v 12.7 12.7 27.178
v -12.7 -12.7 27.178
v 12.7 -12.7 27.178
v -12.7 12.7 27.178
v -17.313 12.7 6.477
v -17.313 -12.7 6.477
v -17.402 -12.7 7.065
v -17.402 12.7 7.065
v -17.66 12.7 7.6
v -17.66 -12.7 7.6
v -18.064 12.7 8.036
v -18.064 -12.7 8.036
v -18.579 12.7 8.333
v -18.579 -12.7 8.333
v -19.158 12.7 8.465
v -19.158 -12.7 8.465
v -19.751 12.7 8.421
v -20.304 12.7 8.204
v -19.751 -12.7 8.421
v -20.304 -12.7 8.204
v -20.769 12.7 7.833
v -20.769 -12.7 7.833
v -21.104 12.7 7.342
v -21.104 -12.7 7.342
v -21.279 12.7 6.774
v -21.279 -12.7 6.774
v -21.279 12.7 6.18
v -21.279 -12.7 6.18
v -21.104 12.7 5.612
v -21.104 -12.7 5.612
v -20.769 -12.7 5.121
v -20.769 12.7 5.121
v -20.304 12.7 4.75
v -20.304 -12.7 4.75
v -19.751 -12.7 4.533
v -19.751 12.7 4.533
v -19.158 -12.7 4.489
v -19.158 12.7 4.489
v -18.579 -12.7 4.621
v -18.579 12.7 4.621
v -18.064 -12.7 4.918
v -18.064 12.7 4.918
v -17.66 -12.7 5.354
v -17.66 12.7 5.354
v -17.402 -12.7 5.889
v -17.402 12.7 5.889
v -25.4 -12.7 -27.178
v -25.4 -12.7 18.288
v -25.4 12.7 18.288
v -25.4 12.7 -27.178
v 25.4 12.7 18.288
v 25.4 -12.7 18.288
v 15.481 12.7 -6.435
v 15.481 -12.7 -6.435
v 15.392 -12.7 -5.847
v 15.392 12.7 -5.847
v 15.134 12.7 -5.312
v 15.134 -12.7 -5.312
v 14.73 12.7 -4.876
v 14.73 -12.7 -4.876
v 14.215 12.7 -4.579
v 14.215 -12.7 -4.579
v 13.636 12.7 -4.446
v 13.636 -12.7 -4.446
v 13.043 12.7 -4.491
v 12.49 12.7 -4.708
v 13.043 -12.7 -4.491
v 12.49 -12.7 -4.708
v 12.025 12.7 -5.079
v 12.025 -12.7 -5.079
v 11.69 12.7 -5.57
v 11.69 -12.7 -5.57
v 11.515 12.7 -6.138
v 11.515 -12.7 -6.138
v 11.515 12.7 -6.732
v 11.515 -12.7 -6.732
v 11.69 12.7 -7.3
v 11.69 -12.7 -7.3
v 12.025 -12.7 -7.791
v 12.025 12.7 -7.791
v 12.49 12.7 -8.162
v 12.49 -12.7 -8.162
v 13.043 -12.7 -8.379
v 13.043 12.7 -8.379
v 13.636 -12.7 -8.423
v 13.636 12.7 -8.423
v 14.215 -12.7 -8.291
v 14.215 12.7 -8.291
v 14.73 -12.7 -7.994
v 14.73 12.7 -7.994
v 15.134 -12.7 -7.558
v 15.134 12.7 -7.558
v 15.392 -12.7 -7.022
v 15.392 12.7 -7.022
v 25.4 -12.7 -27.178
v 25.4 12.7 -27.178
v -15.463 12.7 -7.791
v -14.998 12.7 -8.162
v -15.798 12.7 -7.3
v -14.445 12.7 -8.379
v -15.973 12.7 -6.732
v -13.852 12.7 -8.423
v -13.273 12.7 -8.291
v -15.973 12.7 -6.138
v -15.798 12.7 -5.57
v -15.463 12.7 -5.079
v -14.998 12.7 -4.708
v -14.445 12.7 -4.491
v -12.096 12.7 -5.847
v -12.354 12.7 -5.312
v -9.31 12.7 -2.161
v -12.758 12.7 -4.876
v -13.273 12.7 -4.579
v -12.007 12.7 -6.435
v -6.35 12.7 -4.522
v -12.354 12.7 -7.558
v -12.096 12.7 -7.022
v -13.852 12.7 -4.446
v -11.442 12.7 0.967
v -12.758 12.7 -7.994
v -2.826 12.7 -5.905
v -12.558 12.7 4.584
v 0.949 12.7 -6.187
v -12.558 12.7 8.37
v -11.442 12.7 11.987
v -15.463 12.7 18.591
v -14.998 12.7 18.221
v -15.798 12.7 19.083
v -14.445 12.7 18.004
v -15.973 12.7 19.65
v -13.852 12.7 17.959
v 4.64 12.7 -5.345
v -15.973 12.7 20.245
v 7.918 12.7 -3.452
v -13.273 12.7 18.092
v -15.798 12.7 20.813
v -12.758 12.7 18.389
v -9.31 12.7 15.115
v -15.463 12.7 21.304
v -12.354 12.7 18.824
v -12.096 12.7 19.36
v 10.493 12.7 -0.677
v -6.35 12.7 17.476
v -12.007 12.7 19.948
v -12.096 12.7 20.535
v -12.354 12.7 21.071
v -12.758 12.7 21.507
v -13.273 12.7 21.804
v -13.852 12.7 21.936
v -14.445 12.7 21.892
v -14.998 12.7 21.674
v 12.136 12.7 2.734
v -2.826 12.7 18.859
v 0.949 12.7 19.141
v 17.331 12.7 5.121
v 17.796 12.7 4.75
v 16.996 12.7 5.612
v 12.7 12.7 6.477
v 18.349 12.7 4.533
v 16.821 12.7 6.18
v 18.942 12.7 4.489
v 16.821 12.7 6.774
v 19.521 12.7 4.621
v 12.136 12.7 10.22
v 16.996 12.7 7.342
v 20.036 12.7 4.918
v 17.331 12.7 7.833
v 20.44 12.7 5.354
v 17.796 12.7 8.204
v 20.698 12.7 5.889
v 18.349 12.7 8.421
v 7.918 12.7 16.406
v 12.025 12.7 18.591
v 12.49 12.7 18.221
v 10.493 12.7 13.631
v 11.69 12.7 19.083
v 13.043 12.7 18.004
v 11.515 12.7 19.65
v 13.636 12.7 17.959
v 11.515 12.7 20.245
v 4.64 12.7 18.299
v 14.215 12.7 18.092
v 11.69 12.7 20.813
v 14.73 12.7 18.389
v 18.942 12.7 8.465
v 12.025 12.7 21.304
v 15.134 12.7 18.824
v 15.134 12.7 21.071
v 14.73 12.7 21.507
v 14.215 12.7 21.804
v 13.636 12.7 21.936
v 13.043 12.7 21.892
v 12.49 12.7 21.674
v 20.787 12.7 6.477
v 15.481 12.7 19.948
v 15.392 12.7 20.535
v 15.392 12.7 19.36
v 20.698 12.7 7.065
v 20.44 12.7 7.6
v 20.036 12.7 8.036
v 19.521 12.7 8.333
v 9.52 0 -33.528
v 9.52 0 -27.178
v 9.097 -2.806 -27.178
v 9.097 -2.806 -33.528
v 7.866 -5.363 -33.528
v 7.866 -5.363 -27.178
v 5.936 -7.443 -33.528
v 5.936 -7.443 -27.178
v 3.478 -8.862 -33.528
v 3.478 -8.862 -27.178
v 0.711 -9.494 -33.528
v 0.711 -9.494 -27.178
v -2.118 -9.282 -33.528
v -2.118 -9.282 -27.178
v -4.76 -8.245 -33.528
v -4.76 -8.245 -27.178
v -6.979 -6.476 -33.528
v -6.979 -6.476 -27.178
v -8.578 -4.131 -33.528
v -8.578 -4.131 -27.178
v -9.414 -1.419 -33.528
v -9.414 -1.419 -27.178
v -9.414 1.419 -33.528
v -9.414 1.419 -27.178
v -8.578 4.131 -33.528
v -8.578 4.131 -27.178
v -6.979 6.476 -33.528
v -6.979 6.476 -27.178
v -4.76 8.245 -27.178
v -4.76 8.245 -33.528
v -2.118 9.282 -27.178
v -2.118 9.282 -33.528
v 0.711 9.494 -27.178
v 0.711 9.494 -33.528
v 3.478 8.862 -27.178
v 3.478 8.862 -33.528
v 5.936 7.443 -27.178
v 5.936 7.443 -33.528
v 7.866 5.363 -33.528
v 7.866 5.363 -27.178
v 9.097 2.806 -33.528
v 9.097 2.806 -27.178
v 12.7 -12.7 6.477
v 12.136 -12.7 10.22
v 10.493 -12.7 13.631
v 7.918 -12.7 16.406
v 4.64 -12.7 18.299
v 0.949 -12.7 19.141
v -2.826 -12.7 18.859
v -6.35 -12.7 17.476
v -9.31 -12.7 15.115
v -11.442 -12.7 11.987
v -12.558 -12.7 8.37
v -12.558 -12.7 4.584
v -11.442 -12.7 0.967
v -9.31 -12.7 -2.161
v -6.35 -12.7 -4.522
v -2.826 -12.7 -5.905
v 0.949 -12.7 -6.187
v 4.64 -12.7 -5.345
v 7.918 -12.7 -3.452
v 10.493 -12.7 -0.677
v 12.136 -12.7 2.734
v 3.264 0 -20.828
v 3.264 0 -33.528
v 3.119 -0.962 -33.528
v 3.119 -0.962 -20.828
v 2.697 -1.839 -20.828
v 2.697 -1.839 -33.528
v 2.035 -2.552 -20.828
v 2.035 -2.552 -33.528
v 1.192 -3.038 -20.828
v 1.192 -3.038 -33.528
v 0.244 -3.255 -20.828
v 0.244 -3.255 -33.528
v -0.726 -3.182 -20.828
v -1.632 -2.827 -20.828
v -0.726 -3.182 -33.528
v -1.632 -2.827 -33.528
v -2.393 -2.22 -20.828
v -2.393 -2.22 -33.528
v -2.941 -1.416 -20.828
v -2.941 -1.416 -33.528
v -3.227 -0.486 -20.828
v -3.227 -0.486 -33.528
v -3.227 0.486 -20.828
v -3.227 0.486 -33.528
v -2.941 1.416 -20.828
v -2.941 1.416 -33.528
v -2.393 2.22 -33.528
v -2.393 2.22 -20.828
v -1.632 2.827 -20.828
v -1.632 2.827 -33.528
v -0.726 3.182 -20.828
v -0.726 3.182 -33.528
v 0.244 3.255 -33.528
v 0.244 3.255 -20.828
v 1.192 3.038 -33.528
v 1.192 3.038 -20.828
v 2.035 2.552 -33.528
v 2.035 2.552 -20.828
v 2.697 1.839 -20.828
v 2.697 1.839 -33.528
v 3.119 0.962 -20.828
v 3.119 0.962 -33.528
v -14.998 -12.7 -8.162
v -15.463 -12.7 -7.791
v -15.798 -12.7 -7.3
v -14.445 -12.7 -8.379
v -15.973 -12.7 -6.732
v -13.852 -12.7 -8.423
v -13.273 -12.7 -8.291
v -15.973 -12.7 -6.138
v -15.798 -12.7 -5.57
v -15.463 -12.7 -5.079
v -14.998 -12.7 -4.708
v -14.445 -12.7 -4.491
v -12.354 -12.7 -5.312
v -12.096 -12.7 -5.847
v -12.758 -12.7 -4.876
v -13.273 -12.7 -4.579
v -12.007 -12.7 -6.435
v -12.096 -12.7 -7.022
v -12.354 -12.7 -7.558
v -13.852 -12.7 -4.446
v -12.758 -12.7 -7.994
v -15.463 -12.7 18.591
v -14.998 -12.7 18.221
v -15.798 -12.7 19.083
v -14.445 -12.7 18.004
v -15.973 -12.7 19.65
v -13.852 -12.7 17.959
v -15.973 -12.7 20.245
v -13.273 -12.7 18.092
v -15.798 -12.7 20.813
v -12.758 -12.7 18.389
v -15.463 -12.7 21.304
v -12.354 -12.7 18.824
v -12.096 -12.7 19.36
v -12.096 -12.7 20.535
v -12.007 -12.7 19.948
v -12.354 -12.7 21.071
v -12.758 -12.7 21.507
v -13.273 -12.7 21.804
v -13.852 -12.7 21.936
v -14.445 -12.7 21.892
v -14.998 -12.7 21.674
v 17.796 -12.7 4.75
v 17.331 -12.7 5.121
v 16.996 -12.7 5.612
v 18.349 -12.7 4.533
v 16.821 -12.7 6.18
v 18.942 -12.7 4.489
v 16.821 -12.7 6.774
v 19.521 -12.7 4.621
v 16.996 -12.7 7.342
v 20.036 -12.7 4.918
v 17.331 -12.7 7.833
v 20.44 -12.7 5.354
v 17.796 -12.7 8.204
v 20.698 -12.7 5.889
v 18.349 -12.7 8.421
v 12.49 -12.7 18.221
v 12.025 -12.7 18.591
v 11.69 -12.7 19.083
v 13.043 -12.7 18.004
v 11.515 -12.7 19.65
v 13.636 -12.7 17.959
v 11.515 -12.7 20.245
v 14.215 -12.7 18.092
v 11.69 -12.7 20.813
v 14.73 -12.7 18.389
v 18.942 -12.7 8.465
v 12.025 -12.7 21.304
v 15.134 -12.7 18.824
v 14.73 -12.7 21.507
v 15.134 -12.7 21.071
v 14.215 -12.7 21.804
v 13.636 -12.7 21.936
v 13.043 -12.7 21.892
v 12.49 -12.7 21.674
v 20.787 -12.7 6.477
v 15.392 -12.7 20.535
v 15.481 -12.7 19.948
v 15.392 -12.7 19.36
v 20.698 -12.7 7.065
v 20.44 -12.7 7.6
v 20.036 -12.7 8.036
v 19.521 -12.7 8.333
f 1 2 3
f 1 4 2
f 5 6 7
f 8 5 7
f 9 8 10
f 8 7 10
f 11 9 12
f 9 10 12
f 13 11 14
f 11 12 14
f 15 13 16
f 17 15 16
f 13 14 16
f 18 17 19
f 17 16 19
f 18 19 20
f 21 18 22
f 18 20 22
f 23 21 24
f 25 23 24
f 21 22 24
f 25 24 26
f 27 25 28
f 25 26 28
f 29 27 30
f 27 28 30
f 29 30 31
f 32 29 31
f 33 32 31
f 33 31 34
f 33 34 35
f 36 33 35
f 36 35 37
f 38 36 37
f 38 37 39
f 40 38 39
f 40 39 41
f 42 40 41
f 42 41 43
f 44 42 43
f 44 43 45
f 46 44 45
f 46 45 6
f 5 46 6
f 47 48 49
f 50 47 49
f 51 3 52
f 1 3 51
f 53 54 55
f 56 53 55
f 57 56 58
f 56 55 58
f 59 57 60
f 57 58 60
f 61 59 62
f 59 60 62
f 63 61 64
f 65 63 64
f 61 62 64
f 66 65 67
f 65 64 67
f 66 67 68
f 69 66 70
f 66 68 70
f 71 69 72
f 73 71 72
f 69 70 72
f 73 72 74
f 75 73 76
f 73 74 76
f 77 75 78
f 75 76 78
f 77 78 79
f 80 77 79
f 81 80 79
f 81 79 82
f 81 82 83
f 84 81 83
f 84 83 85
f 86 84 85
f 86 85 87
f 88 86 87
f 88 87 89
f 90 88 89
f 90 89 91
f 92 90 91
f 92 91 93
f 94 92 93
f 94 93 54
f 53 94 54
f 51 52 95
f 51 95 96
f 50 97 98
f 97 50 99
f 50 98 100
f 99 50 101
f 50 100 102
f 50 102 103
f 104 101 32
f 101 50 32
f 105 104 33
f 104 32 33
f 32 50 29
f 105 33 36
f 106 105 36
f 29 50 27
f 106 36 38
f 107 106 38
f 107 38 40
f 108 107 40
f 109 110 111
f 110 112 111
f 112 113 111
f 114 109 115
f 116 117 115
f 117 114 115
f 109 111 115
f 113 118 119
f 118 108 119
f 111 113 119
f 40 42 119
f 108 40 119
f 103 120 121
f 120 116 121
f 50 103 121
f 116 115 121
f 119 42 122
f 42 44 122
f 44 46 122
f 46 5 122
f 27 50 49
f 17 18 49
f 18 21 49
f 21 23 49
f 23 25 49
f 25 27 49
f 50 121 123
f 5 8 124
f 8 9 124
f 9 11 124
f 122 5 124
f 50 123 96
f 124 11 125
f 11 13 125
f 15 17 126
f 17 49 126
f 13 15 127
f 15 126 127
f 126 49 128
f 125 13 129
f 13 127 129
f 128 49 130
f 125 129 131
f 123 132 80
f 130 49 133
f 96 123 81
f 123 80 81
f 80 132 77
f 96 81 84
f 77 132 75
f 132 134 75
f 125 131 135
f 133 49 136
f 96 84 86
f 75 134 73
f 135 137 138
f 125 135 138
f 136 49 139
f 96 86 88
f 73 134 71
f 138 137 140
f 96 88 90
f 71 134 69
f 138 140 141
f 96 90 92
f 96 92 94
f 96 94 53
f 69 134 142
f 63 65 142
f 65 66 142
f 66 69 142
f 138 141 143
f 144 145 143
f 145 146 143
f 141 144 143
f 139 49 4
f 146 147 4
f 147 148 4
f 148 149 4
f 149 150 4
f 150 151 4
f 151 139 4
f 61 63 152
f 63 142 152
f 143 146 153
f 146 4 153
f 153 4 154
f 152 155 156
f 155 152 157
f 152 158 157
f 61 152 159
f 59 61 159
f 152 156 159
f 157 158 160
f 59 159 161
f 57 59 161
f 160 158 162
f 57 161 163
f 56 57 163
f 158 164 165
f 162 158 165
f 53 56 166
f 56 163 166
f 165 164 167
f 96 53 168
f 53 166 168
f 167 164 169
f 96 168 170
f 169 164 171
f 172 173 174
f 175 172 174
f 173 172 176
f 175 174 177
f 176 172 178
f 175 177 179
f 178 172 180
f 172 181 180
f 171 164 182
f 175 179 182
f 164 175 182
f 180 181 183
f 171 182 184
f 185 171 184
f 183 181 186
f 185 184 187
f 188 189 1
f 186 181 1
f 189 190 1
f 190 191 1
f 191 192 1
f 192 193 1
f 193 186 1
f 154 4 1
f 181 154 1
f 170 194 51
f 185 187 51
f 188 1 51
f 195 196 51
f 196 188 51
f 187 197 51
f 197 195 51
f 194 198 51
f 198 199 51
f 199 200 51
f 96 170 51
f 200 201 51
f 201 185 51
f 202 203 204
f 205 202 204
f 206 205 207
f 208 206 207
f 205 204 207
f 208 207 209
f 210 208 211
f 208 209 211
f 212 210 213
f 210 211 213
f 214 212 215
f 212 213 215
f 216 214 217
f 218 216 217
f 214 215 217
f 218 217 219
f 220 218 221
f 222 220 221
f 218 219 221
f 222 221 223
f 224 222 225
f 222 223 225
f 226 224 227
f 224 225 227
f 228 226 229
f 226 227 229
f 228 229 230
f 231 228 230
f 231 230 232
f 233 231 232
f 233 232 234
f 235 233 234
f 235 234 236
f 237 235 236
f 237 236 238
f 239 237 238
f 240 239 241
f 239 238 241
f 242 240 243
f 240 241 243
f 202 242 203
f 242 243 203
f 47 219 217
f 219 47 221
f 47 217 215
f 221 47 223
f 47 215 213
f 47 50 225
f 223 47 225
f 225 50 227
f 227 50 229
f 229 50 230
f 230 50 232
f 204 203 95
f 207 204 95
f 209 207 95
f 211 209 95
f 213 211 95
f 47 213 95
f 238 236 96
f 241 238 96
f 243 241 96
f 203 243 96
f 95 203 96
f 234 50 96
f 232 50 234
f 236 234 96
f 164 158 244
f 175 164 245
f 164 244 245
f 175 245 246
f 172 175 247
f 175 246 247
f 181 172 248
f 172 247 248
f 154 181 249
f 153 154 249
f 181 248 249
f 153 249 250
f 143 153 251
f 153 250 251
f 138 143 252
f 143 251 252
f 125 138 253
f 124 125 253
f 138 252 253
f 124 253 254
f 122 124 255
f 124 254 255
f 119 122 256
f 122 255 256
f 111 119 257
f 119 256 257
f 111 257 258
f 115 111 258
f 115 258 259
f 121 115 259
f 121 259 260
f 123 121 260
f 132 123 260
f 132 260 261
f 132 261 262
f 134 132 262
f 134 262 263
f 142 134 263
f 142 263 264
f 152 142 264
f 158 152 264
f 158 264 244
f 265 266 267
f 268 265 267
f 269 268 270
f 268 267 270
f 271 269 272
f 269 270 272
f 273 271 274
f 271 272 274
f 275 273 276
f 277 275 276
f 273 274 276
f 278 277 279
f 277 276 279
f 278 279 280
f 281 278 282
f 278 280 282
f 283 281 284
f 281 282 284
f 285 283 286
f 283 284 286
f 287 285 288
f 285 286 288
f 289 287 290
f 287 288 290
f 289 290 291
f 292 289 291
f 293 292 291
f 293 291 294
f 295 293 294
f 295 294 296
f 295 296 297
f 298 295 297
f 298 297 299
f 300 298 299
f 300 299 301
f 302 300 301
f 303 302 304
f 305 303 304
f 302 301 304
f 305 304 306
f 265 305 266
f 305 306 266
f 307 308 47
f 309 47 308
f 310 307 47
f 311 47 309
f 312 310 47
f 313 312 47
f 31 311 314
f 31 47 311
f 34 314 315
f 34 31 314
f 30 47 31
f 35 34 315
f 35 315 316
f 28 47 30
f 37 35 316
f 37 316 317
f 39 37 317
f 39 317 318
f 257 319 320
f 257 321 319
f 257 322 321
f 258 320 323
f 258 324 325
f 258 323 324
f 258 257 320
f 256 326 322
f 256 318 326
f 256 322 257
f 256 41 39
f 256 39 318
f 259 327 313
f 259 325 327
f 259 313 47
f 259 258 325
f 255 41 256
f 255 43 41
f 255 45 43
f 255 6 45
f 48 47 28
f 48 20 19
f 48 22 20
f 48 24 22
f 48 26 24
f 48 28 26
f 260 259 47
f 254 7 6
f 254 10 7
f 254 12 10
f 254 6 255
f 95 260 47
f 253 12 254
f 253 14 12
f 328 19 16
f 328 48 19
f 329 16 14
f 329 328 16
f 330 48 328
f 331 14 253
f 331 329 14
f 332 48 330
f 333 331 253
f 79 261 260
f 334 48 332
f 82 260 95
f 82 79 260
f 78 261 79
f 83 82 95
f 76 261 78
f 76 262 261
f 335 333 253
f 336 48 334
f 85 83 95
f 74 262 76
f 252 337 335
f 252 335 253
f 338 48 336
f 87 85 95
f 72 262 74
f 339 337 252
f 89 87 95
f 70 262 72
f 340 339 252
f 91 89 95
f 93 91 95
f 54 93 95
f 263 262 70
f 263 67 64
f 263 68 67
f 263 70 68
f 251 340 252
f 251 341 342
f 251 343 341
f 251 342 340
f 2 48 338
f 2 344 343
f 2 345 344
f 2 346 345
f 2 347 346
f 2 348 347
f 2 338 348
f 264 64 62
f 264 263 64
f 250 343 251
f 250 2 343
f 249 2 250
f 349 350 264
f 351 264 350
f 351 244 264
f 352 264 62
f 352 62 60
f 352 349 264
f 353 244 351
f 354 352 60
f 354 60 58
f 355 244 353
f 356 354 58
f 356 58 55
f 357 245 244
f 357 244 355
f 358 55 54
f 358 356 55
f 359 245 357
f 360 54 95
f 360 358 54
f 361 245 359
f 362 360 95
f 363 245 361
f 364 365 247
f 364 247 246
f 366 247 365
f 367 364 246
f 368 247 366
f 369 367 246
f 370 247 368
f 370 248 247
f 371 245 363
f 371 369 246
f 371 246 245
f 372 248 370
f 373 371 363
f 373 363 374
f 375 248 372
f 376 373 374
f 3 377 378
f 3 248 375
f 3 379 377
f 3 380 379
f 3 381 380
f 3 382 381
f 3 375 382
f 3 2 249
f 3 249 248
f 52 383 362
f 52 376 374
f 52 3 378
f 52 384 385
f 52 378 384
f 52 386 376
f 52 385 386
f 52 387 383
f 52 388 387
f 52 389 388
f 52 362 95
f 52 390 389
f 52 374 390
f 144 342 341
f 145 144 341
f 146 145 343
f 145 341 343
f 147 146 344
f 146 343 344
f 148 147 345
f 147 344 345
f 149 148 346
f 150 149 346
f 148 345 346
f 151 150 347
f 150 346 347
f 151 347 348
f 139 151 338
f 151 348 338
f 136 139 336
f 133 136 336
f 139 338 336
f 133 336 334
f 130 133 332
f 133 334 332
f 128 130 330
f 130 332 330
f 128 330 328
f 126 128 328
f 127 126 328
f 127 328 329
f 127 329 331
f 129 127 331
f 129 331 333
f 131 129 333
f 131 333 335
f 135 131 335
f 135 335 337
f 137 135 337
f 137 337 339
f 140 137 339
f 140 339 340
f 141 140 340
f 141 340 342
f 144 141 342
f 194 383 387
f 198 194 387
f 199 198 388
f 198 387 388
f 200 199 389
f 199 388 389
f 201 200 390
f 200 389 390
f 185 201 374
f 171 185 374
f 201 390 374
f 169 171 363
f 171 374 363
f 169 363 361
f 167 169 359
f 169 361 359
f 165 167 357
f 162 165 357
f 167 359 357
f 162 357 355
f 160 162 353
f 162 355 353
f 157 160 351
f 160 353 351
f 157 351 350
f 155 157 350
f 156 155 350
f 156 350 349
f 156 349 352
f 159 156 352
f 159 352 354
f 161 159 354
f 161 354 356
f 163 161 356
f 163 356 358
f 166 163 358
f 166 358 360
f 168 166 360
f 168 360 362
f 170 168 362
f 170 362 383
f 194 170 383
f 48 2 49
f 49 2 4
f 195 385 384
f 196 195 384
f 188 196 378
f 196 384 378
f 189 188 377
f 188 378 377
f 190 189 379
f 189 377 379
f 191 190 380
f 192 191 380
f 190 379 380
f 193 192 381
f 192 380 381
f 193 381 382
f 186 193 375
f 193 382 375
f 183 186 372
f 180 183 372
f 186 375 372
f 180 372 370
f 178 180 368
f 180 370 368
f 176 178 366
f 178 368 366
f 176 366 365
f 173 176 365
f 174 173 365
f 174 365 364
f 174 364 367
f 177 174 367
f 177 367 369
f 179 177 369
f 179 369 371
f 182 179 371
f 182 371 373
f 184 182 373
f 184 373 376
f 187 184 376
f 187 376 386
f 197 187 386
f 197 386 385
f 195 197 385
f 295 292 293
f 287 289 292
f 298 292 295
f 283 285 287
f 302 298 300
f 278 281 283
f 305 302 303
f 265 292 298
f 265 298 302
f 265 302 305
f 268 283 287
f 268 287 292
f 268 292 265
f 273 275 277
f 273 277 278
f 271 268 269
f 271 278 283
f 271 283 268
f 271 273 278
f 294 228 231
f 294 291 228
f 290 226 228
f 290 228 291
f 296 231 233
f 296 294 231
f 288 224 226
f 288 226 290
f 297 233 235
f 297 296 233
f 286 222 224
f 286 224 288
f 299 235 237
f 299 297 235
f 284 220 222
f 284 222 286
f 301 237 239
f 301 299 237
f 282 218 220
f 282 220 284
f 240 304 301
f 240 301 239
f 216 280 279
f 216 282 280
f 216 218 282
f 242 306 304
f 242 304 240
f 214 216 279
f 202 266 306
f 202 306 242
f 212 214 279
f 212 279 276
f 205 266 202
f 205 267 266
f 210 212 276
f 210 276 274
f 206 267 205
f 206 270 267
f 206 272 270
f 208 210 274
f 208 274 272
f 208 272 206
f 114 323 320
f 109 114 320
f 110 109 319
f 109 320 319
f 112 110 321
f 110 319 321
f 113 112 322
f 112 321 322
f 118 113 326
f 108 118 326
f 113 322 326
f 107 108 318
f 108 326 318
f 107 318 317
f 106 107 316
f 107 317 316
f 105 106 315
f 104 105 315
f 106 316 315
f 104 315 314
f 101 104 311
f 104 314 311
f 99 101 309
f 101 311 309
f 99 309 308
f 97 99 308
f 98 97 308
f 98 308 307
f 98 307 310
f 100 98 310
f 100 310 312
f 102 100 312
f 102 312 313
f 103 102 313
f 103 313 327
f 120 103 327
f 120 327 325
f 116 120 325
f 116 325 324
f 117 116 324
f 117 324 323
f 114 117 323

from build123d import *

# Parameters (mm, degrees)
F0_W       = 50.8
F0_H       = 25.4
F1_DEPTH   = 27.178
F2_SIZE2   = 12.7
F2_SIZE    = 8.89
F2_2_SIZE2 = 12.7
F2_2_SIZE  = 8.89
F4_R       = 1.9939
F5_DEPTH   = 25.401
F3_R       = 12.7
F6_DEPTH   = 25.401
F7_R       = 9.5204472643
F8_DEPTH   = 6.35
F9_R       = 3.2639
F10_DEPTH  = 12.7


with BuildPart() as f1:
    # F0 (on Top) → F1 (new body, symmetric)
    with BuildSketch(Plane.XY):
        Rectangle(F0_W, F0_H)
    extrude(amount=F1_DEPTH, both=True)

    # F2
    f2_edges = [f1.edges().sort_by_distance(p)[0] for p in [
        (-25.4, 0, 27.178),
    ]]
    f2_side = f1.faces().sort_by_distance((-25.4, 0, 0))[0]
    chamfer(f2_edges, length=F2_SIZE, length2=F2_SIZE2, reference=f2_side)

    # F2#2
    f2_2_edges = [f1.edges().sort_by_distance(p)[0] for p in [
        (25.4, 0, 27.178),
    ]]
    f2_2_side = f1.faces().sort_by_distance((25.4, 0, 0))[0]
    chamfer(f2_2_edges, length=F2_2_SIZE, length2=F2_2_SIZE2, reference=f2_2_side)

    # F4 (on face) → F5 (cut, through all)
    with BuildSketch(Plane.XZ.offset(12.7)):
        with Locations((-14.0012001136, 19.9476279852)):
            Circle(F4_R)
        with Locations((13.4866058279, 19.9476279852)):
            Circle(F4_R)
        with Locations((18.7927028571, 6.477)):
            Circle(F4_R)
        with Locations((13.4866058279, -6.4347624395)):
            Circle(F4_R)
        with Locations((-14.0012001136, -6.4347624395)):
            Circle(F4_R)
        with Locations((-19.3072971429, 6.477)):
            Circle(F4_R)
    extrude(amount=-F5_DEPTH, mode=Mode.SUBTRACT)

    # F3 (on face) → F6 (cut, through all)
    with BuildSketch(Plane.XZ.offset(12.7)):
        with Locations((0, 6.477)):
            Circle(F3_R)
    extrude(amount=-F6_DEPTH, mode=Mode.SUBTRACT)

    # F7 (on face) → F8 (join)
    with BuildSketch(Plane(origin=(0, 0, -27.178), x_dir=(1, 0, 0), z_dir=(0, 0, -1))):
        Circle(F7_R)
    extrude(amount=F8_DEPTH)

    # F9 (on face) → F10 (cut)
    with BuildSketch(Plane(origin=(0, 0, -33.528), x_dir=(1, 0, 0), z_dir=(0, 0, -1))):
        Circle(F9_R)
    extrude(amount=-F10_DEPTH, mode=Mode.SUBTRACT)


solid = f1.part
